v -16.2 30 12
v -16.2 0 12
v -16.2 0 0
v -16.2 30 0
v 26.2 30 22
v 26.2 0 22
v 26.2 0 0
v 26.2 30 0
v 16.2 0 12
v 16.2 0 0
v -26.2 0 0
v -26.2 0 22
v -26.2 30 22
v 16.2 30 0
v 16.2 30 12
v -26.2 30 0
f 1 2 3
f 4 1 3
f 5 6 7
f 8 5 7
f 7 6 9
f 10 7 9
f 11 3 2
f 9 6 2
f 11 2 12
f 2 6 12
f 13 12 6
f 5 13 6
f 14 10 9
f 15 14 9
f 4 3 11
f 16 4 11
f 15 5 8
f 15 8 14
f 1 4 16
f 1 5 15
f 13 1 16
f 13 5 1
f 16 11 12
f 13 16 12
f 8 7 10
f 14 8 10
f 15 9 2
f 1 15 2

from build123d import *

# Parameters (mm, degrees)
EXTRUDE_DEPTH                  = 30
EXTRUDE_ONTO_SKETCH_ROLL_ANGLE = 90


with BuildPart() as part:
    # Sketch as drawn → Extrude (new)
    with BuildSketch(Plane.XY):
        Polygon((-26.2, 22), (26.2, 22), (26.2, 0), (16.2, 0), (16.2, 12), (-16.2, 12), (-16.2, 0), (-26.2, 0), align=None)
    extrude(amount=-EXTRUDE_DEPTH)


with BuildPart() as part_1:
    # Extrude onto Sketch roll: moved
    add(part.part.rotate(Axis((0, 0, 0), (1, 0, 0)), EXTRUDE_ONTO_SKETCH_ROLL_ANGLE))


with BuildPart() as part_2:
    # Extrude onto Sketch placement: moved
    add(part_1.part)


solid = part_2.part
